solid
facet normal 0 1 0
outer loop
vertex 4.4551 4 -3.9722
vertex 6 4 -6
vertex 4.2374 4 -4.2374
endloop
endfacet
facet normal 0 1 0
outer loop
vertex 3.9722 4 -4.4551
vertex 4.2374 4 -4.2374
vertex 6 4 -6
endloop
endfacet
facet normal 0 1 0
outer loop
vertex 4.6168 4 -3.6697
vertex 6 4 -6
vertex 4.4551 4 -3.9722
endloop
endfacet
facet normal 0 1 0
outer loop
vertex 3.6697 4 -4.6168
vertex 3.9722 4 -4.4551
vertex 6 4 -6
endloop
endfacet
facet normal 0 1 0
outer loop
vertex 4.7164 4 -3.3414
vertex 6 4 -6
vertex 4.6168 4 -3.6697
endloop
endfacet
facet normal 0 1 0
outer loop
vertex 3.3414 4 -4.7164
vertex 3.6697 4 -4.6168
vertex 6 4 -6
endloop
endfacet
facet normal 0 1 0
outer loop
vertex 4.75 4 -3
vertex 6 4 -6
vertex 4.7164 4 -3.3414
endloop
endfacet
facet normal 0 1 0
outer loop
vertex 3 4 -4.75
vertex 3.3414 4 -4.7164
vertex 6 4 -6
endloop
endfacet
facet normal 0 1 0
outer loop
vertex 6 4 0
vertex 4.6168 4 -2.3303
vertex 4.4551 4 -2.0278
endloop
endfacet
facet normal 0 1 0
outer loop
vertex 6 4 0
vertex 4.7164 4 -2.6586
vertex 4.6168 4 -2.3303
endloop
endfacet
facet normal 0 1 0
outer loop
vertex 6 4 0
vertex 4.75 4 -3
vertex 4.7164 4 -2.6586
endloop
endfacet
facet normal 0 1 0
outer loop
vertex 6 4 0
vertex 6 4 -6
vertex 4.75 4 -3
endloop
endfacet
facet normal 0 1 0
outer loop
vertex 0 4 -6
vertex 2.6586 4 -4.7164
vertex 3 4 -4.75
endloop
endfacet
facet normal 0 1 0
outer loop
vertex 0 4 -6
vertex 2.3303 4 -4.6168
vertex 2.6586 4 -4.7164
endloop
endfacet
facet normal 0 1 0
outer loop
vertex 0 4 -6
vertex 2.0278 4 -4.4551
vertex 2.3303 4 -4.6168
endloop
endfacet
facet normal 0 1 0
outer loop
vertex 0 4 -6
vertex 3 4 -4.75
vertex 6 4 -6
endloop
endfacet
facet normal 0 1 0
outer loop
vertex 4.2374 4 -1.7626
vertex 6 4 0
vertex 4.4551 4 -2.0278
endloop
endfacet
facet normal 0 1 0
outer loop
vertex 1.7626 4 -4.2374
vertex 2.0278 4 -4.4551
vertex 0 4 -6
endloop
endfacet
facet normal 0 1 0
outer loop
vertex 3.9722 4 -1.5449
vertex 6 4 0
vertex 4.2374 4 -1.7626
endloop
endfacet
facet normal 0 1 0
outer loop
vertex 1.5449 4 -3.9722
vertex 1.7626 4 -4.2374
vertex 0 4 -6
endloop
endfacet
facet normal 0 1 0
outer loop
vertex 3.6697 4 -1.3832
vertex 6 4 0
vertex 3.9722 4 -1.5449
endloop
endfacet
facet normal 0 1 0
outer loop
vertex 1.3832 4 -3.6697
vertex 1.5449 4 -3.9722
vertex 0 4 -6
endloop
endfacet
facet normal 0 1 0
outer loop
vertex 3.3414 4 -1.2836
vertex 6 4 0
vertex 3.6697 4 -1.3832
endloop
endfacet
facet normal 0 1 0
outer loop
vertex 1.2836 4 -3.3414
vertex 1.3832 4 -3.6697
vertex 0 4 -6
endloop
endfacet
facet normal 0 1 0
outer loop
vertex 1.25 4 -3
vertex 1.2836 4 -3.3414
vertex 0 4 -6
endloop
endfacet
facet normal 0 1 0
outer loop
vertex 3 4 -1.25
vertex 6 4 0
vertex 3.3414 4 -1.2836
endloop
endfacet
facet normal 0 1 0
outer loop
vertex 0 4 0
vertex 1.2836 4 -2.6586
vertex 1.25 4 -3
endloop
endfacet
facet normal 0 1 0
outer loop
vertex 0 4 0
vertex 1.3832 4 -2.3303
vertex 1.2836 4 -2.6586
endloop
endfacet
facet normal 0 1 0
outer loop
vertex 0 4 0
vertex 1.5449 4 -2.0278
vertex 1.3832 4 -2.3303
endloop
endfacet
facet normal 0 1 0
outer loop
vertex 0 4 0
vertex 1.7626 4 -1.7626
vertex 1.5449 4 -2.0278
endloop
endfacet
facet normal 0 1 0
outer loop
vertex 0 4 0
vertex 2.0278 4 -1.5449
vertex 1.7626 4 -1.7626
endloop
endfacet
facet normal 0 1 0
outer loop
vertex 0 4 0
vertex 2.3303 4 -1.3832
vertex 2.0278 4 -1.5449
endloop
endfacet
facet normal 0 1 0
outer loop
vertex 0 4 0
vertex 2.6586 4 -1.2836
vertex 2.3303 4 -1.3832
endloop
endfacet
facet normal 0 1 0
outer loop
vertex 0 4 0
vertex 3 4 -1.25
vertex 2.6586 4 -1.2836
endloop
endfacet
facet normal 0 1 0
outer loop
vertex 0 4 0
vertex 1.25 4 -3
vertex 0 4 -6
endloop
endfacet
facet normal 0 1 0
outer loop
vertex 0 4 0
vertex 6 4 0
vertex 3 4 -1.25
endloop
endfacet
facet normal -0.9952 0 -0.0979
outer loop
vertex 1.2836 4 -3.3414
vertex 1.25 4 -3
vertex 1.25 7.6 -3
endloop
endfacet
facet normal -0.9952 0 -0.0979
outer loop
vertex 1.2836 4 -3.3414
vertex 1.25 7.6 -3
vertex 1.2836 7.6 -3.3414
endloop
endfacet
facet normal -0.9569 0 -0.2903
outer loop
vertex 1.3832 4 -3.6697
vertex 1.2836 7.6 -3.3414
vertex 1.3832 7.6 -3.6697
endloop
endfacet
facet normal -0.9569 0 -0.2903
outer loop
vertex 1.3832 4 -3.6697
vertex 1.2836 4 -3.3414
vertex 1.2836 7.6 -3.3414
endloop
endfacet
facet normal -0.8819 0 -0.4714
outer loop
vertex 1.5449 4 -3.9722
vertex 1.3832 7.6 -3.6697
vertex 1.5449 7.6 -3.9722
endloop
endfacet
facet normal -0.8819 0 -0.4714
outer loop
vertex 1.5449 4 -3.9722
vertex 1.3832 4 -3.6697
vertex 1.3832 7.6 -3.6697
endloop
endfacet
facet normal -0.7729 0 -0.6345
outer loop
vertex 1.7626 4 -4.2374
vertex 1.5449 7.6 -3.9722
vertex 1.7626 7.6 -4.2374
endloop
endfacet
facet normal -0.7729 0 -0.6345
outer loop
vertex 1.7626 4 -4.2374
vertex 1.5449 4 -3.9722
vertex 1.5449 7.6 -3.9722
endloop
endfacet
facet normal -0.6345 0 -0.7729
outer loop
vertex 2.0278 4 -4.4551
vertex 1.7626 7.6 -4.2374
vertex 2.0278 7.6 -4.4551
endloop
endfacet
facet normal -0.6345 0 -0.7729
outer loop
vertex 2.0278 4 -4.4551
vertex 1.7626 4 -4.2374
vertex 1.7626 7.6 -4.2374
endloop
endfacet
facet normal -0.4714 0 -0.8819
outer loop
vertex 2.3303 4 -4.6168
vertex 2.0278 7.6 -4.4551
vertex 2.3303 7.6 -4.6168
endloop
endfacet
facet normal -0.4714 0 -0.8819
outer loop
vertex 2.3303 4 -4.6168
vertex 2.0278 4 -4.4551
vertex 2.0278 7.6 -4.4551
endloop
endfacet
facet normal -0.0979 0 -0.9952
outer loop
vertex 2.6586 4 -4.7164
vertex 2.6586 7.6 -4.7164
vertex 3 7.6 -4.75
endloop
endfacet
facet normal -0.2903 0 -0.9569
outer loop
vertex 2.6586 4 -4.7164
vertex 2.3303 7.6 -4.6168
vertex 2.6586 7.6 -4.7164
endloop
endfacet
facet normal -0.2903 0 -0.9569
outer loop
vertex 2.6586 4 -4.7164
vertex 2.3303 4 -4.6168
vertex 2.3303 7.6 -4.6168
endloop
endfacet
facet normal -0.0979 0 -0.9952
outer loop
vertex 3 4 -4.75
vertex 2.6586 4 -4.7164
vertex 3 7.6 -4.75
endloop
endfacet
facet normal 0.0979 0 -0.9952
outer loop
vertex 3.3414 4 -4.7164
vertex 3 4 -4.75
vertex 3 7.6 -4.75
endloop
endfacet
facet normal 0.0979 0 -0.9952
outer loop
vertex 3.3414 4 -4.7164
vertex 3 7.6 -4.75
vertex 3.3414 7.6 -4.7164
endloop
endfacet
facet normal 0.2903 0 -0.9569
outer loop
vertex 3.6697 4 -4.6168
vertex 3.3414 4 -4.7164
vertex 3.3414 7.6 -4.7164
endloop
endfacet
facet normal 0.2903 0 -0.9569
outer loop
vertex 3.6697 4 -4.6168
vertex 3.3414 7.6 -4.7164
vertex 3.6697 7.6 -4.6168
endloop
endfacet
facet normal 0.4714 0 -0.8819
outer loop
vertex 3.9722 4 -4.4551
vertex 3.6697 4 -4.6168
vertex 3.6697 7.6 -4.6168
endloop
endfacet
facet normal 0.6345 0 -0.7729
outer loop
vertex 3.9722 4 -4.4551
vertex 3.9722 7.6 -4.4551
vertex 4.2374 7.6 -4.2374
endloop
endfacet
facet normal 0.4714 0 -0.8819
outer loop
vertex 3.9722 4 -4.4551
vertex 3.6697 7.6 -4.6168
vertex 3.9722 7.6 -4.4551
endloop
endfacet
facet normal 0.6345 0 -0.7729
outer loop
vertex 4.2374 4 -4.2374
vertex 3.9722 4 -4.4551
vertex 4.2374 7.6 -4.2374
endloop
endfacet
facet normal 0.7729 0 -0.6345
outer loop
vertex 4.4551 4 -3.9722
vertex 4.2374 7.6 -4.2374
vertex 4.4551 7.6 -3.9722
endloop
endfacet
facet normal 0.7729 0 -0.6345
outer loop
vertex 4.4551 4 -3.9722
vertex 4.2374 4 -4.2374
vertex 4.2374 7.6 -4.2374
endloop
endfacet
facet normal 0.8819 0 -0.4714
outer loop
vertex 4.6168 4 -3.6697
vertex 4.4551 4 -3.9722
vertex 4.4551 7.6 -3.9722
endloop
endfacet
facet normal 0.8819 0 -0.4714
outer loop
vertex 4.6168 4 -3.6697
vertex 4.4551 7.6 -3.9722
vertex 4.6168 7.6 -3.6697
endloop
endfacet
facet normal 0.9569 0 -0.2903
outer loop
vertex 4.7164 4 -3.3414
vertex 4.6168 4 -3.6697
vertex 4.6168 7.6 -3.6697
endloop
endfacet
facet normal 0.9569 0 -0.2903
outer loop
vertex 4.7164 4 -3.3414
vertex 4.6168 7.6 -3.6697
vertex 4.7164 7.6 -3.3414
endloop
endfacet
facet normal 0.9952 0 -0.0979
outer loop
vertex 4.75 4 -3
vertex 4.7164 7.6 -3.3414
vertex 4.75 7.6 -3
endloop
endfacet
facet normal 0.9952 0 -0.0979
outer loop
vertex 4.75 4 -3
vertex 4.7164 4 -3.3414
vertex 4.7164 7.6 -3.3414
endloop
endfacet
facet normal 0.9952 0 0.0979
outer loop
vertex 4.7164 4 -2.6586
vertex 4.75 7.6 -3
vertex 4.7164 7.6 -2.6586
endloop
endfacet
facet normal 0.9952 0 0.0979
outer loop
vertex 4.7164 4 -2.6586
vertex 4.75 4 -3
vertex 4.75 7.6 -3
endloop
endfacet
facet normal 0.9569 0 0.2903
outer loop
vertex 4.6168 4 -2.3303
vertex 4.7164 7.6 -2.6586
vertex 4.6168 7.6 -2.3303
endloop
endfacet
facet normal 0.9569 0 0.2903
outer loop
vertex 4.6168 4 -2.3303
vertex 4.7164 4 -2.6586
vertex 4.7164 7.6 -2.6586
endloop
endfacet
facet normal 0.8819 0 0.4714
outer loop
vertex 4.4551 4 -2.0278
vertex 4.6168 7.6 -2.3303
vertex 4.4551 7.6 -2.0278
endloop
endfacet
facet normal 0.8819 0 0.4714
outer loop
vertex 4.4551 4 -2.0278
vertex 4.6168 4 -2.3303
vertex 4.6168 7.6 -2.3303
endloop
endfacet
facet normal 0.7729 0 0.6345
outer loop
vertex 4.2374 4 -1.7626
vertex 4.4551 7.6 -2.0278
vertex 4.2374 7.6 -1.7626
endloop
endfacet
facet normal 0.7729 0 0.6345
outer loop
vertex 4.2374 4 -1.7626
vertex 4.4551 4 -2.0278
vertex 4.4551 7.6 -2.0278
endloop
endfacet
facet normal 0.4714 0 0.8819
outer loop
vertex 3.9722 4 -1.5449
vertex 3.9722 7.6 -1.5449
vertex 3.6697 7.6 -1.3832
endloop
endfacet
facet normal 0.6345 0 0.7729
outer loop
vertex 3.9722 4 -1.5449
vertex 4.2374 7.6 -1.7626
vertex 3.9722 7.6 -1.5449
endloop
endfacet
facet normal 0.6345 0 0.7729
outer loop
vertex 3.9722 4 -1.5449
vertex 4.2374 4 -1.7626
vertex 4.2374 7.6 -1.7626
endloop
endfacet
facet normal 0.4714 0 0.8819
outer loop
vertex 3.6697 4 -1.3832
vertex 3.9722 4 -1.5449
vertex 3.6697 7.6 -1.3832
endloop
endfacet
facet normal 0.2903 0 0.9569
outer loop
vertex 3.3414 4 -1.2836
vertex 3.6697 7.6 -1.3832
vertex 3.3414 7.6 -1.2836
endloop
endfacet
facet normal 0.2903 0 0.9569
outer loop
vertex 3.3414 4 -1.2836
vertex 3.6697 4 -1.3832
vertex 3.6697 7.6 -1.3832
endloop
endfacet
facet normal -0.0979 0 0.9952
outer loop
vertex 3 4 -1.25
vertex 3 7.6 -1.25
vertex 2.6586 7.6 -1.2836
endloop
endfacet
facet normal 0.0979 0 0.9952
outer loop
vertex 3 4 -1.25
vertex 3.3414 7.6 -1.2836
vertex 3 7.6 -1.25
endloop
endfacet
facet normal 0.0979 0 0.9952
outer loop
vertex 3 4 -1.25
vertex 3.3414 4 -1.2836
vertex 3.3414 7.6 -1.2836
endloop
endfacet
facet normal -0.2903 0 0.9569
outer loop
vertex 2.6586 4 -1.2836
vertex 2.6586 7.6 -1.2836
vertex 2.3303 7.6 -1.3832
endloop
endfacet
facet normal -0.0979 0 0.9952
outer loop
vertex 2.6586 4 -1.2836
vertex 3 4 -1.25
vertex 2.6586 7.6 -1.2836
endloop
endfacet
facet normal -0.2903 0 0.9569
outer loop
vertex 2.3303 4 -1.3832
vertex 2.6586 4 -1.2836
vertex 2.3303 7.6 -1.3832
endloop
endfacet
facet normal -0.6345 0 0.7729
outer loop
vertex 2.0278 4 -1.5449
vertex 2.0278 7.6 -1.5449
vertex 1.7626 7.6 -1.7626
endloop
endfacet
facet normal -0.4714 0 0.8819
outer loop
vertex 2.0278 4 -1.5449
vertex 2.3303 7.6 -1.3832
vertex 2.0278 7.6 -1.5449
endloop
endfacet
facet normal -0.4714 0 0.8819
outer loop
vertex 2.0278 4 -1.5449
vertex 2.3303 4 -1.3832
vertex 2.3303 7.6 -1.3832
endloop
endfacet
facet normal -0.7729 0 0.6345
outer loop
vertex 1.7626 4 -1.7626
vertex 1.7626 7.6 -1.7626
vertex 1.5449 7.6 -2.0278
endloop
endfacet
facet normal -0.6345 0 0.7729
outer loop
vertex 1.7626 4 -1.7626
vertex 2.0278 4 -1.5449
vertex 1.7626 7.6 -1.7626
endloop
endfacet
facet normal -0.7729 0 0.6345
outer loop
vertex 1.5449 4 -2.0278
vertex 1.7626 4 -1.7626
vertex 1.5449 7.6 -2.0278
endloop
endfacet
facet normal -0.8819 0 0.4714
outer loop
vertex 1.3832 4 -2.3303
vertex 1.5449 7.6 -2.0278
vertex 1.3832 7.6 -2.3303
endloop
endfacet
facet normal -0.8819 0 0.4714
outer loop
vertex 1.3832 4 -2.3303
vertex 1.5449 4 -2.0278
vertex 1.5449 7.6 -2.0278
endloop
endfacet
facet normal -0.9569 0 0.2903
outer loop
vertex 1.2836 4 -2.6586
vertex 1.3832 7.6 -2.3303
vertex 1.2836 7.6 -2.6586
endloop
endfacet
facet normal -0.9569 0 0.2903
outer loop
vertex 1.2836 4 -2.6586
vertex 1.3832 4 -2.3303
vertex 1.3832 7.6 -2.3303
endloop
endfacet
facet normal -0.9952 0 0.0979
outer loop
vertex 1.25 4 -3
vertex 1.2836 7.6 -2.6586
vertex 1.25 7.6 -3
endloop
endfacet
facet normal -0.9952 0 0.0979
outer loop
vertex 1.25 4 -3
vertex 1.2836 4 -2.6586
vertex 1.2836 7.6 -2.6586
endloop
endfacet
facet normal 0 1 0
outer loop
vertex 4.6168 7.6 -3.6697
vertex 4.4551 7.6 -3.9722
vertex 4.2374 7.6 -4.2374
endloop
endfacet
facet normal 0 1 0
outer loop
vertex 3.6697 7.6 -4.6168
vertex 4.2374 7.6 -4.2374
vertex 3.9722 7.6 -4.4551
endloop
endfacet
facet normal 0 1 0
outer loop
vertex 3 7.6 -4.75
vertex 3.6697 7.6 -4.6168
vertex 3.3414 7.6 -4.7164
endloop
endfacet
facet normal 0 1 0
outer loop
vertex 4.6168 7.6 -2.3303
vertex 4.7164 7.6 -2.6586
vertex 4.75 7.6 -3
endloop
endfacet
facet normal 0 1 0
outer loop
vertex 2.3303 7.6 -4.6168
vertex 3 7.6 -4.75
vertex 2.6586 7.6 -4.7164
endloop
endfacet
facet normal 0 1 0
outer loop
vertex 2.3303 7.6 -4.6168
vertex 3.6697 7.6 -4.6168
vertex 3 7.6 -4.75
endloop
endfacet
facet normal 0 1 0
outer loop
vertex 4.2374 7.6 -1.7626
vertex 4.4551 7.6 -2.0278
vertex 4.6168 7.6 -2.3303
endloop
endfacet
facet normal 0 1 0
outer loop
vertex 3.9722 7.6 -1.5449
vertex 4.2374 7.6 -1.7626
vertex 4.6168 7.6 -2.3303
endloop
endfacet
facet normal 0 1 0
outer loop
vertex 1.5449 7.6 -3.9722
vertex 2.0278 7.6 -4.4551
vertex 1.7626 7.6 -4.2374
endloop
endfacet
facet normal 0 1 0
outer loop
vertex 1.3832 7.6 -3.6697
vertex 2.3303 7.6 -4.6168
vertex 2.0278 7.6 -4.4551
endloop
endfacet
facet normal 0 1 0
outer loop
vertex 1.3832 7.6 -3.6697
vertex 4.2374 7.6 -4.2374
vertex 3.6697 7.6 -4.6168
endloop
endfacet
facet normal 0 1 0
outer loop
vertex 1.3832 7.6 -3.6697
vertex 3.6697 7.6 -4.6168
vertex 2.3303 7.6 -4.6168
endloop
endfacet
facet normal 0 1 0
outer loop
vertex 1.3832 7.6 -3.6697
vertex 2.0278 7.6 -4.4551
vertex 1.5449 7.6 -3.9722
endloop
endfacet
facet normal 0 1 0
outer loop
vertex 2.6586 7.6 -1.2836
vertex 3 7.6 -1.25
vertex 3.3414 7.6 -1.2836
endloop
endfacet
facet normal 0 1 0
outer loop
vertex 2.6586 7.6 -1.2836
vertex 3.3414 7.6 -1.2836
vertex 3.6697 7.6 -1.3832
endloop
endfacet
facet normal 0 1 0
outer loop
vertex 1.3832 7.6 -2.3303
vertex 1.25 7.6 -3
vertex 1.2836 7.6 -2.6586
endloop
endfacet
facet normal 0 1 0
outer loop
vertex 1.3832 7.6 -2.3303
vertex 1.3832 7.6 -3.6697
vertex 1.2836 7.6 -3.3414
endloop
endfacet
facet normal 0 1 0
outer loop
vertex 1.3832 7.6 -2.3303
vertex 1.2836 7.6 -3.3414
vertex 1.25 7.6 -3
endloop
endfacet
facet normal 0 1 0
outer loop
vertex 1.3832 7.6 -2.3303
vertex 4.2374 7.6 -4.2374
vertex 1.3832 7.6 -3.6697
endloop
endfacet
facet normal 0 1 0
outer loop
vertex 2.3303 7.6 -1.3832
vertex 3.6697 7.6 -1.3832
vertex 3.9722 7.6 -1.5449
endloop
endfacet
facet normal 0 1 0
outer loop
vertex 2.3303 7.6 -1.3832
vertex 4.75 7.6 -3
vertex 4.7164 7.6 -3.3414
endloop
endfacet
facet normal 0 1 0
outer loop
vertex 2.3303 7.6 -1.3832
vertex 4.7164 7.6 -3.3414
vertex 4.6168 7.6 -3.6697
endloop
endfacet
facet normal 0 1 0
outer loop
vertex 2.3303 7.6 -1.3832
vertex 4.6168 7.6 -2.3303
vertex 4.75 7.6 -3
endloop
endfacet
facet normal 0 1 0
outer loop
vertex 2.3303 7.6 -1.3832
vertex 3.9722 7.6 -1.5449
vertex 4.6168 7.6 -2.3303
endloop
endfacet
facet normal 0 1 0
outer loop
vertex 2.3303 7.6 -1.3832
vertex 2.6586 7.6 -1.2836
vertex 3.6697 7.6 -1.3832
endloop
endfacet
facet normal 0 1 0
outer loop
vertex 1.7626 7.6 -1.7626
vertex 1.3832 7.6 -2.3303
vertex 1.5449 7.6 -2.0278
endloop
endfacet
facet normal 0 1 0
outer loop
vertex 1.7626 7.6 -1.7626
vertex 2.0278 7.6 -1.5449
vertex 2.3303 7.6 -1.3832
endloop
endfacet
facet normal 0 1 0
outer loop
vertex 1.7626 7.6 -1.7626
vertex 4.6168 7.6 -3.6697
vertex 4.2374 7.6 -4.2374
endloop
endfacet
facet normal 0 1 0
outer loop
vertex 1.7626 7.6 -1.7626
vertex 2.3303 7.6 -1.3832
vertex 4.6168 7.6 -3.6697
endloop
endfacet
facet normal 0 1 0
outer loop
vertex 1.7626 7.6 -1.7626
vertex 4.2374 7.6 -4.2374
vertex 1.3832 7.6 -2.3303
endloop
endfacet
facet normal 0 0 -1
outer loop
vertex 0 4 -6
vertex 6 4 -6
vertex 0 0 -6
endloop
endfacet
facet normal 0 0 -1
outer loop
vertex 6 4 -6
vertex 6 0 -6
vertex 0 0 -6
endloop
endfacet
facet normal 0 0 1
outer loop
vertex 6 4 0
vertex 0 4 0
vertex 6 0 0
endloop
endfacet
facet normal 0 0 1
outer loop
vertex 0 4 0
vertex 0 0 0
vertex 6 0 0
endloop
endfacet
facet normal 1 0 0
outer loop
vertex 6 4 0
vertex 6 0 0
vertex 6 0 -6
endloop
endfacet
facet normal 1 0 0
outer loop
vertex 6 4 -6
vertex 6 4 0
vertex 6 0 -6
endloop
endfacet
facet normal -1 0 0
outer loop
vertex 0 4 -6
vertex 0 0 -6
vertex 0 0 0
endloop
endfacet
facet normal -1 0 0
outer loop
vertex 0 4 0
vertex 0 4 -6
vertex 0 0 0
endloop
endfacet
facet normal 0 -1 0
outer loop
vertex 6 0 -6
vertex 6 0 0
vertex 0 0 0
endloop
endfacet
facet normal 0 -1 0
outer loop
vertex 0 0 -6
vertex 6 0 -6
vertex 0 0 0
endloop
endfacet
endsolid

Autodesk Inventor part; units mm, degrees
ref_plane "YZ Plane" through (0, 0, 0) normal (1, 0, 0) x (0, 1, 0)
ref_plane "XZ Plane" through (0, 0, 0) normal (0, 1, 0) x (-1, 0, 0)
ref_plane "XY Plane" through (0, 0, 0) normal (0, 0, 1) x (1, 0, 0)
sketch "Sketch1" plane through (0, 0, 0) normal (0, 1, 0) x (-1, 0, 0)
  line L0 (0, 0) -> (-6, 0)
  line L1 (-6, 0) -> (-6, -6)
  line L2 (-6, -6) -> (0, -6)
  line L3 (0, -6) -> (0, 0)
  circle A0 centre (-3, -3) radius 1.75
  dimension "d9" = 6
  dimension "d10" = 6
  dimension "d13" = 3.5
extrude "Extrusion3" add sketch "Sketch1" along normal blind 4 contours L3 L2 L1 L0 | A0
extrude "Extrusion4" add sketch "Sketch1" along normal blind 3.6 from surface at 4 contours A0
properties part number "ESP32_C3_SM"
